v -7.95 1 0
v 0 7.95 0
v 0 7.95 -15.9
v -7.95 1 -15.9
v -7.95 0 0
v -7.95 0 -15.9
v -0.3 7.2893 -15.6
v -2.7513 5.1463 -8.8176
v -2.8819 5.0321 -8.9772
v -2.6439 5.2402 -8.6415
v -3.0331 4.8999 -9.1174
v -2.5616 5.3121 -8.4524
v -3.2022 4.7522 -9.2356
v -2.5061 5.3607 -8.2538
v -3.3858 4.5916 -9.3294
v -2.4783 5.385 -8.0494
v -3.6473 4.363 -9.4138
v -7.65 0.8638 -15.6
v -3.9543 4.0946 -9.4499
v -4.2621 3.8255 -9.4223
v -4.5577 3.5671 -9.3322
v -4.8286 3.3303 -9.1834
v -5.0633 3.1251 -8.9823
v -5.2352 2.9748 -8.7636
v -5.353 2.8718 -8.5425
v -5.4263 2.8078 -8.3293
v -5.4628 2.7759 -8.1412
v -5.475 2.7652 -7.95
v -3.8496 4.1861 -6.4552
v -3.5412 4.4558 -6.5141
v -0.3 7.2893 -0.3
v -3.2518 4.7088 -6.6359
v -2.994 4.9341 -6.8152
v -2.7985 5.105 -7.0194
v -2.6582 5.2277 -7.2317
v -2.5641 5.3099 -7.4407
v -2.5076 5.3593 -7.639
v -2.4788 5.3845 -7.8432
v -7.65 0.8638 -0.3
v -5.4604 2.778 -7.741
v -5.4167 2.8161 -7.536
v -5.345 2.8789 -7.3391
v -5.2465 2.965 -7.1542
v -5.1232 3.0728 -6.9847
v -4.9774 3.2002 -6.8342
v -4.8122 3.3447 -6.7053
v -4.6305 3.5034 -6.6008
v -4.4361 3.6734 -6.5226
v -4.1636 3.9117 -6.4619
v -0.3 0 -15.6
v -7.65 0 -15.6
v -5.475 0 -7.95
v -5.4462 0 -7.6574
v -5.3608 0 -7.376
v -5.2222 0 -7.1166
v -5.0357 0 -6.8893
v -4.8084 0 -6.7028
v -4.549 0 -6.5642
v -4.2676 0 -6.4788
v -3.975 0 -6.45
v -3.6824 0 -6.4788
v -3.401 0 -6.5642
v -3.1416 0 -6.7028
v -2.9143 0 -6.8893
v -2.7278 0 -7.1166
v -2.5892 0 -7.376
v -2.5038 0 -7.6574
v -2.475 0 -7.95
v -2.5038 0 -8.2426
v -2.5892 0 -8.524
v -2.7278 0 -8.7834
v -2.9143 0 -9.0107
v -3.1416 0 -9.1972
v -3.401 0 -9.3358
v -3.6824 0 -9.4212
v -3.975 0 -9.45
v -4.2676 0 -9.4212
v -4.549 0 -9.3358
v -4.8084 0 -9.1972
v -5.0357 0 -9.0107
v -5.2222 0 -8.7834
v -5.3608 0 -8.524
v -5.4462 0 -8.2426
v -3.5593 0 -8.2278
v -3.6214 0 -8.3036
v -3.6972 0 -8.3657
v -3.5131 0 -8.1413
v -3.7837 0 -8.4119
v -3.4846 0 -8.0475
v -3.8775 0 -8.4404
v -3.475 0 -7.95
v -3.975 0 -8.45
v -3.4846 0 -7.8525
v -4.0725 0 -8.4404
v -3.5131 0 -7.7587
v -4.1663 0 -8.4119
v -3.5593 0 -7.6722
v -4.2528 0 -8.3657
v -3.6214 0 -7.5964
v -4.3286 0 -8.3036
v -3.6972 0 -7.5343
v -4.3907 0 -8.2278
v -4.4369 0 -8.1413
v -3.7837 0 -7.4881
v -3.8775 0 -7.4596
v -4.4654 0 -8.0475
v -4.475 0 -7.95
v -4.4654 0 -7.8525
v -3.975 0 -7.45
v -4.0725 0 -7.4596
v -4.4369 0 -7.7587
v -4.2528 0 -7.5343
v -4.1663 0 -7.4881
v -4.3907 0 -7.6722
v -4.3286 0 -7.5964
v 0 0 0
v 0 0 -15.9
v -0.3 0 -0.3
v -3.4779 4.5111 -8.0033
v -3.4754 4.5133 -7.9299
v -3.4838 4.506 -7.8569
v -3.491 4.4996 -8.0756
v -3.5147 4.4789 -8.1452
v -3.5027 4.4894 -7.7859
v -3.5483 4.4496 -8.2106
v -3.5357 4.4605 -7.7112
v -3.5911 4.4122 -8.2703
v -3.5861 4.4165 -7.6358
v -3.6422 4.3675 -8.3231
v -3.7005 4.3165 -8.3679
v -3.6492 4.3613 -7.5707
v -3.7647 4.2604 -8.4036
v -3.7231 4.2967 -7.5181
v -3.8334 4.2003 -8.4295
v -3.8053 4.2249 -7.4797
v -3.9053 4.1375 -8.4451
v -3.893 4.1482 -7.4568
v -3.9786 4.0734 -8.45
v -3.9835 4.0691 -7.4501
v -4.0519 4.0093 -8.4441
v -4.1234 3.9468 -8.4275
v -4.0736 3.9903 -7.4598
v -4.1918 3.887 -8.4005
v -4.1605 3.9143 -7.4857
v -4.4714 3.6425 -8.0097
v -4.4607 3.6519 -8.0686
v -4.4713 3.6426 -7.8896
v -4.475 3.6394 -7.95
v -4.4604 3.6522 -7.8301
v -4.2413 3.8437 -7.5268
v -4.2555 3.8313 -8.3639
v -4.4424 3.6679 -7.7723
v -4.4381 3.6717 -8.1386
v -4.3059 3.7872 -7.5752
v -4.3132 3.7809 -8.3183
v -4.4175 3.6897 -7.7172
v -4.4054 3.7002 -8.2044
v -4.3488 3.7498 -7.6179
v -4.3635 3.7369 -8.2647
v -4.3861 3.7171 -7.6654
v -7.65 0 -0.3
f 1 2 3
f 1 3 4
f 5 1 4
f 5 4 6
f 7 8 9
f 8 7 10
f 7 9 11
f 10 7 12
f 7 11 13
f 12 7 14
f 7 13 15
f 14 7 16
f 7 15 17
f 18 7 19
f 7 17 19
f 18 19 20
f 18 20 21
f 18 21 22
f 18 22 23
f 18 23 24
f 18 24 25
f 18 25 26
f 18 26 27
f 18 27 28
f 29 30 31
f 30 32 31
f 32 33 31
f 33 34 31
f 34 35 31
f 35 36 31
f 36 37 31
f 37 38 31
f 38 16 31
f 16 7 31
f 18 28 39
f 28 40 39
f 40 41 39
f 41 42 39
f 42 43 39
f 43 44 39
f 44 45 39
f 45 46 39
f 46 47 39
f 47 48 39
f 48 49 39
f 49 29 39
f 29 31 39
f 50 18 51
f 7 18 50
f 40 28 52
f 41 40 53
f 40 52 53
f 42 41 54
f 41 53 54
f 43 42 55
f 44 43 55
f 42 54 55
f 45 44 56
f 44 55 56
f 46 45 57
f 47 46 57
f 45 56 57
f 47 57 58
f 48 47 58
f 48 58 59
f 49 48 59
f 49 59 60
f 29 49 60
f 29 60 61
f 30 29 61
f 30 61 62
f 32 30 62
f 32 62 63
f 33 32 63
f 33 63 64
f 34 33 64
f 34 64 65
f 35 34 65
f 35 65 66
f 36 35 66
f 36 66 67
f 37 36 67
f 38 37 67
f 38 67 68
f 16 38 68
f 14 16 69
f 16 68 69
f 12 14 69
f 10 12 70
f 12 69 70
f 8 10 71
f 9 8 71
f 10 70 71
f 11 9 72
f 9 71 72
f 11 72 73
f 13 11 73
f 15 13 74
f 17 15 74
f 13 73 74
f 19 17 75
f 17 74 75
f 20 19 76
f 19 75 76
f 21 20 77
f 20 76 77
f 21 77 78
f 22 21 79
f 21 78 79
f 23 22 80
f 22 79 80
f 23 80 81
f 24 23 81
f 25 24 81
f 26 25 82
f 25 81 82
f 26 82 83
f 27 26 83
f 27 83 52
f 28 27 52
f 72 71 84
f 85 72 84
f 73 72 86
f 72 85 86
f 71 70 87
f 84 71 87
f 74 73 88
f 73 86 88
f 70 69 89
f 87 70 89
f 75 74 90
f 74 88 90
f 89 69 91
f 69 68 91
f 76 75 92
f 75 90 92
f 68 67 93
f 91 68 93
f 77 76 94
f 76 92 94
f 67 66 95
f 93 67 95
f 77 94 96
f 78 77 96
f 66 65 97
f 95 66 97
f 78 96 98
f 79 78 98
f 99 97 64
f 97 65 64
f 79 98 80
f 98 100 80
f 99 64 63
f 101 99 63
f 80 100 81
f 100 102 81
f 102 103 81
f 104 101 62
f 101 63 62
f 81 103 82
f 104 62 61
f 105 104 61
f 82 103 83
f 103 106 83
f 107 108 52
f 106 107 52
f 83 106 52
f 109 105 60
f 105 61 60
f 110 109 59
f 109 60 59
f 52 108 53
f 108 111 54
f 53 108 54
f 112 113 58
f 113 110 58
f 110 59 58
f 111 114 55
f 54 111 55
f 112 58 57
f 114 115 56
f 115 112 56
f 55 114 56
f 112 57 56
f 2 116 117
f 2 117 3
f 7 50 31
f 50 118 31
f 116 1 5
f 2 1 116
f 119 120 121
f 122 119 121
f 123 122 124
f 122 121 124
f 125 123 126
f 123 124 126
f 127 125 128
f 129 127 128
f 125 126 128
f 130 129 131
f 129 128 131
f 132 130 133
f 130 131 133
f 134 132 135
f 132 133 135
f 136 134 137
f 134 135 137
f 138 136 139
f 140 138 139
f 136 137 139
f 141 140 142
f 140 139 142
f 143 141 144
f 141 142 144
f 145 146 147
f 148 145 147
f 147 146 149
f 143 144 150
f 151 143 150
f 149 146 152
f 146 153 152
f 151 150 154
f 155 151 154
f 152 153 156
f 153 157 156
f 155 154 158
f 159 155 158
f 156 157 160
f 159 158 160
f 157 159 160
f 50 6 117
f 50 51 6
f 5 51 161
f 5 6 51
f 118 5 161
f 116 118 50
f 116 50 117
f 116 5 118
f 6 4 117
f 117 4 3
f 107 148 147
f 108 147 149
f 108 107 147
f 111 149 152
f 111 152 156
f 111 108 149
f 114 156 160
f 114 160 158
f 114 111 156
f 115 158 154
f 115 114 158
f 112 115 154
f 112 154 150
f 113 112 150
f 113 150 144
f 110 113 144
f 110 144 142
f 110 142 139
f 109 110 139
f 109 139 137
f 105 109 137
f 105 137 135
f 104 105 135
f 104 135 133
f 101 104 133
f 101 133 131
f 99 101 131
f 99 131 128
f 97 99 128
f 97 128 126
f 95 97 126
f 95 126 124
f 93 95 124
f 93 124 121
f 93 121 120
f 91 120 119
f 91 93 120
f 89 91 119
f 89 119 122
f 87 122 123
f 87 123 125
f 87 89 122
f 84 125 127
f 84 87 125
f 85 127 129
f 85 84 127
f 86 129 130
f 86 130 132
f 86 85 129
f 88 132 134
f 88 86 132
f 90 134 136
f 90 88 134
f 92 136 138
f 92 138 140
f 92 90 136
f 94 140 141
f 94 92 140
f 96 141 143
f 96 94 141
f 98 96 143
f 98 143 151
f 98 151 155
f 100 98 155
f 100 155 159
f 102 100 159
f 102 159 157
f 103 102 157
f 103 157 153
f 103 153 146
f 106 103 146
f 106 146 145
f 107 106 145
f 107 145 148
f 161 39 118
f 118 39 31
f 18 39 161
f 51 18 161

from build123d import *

# Parameters (mm, degrees)
BOSS_EXTRUDE1_DEPTH = 15.9
SHELL1_T            = -0.3
BOSS_EXTRUDE2_REACH = 21.473
SKETCH2_R           = 1.5
SKETCH2_R_2         = 0.5


with BuildPart() as part:
    # Sketch1 → Boss-Extrude1 (new body)
    with BuildSketch(Plane.XY):
        Polygon((0, 0), (0, 7.95), (-7.95, 1), (-7.95, 0), align=None)
    extrude(amount=-BOSS_EXTRUDE1_DEPTH)

    # Shell1
    shell1_openings = [part.faces().sort_by_distance(p)[0] for p in [
        (-3.975, 0, -7.95),
    ]]
    offset(amount=SHELL1_T, openings=shell1_openings, kind=Kind.INTERSECTION)

    # Boss-Extrude2: up to this plane
    boss_extrude2_end = Plane(origin=(-7.752549204, 0.774139018, -15.9), z_dir=(-0.6581693191022402, 0.7528699405557999, 0))
    # Sketch2 → Boss-Extrude2 (add, up to the surface)
    with BuildSketch(Plane(origin=(0, 0, 0), x_dir=(1, 0, 0), z_dir=(0, 1, 0)), mode=Mode.PRIVATE) as boss_extrude2_sk1:
        with Locations(Location((-3.975, 7.95, 0), (0, 0, 180))):
            Circle(SKETCH2_R)
        with Locations(Location((-3.975, 7.95, 0), (0, 0, 180))):
            Circle(SKETCH2_R_2, mode=Mode.SUBTRACT)
    boss_extrude2_tool1 = split(extrude(boss_extrude2_sk1.sketch, amount=BOSS_EXTRUDE2_REACH, mode=Mode.PRIVATE), bisect_by=boss_extrude2_end, keep=Keep.BOTH, mode=Mode.PRIVATE)
    add(boss_extrude2_tool1.solids().sort_by_distance((-2.517426, 0, -7.95))[0])


solid = part.part
